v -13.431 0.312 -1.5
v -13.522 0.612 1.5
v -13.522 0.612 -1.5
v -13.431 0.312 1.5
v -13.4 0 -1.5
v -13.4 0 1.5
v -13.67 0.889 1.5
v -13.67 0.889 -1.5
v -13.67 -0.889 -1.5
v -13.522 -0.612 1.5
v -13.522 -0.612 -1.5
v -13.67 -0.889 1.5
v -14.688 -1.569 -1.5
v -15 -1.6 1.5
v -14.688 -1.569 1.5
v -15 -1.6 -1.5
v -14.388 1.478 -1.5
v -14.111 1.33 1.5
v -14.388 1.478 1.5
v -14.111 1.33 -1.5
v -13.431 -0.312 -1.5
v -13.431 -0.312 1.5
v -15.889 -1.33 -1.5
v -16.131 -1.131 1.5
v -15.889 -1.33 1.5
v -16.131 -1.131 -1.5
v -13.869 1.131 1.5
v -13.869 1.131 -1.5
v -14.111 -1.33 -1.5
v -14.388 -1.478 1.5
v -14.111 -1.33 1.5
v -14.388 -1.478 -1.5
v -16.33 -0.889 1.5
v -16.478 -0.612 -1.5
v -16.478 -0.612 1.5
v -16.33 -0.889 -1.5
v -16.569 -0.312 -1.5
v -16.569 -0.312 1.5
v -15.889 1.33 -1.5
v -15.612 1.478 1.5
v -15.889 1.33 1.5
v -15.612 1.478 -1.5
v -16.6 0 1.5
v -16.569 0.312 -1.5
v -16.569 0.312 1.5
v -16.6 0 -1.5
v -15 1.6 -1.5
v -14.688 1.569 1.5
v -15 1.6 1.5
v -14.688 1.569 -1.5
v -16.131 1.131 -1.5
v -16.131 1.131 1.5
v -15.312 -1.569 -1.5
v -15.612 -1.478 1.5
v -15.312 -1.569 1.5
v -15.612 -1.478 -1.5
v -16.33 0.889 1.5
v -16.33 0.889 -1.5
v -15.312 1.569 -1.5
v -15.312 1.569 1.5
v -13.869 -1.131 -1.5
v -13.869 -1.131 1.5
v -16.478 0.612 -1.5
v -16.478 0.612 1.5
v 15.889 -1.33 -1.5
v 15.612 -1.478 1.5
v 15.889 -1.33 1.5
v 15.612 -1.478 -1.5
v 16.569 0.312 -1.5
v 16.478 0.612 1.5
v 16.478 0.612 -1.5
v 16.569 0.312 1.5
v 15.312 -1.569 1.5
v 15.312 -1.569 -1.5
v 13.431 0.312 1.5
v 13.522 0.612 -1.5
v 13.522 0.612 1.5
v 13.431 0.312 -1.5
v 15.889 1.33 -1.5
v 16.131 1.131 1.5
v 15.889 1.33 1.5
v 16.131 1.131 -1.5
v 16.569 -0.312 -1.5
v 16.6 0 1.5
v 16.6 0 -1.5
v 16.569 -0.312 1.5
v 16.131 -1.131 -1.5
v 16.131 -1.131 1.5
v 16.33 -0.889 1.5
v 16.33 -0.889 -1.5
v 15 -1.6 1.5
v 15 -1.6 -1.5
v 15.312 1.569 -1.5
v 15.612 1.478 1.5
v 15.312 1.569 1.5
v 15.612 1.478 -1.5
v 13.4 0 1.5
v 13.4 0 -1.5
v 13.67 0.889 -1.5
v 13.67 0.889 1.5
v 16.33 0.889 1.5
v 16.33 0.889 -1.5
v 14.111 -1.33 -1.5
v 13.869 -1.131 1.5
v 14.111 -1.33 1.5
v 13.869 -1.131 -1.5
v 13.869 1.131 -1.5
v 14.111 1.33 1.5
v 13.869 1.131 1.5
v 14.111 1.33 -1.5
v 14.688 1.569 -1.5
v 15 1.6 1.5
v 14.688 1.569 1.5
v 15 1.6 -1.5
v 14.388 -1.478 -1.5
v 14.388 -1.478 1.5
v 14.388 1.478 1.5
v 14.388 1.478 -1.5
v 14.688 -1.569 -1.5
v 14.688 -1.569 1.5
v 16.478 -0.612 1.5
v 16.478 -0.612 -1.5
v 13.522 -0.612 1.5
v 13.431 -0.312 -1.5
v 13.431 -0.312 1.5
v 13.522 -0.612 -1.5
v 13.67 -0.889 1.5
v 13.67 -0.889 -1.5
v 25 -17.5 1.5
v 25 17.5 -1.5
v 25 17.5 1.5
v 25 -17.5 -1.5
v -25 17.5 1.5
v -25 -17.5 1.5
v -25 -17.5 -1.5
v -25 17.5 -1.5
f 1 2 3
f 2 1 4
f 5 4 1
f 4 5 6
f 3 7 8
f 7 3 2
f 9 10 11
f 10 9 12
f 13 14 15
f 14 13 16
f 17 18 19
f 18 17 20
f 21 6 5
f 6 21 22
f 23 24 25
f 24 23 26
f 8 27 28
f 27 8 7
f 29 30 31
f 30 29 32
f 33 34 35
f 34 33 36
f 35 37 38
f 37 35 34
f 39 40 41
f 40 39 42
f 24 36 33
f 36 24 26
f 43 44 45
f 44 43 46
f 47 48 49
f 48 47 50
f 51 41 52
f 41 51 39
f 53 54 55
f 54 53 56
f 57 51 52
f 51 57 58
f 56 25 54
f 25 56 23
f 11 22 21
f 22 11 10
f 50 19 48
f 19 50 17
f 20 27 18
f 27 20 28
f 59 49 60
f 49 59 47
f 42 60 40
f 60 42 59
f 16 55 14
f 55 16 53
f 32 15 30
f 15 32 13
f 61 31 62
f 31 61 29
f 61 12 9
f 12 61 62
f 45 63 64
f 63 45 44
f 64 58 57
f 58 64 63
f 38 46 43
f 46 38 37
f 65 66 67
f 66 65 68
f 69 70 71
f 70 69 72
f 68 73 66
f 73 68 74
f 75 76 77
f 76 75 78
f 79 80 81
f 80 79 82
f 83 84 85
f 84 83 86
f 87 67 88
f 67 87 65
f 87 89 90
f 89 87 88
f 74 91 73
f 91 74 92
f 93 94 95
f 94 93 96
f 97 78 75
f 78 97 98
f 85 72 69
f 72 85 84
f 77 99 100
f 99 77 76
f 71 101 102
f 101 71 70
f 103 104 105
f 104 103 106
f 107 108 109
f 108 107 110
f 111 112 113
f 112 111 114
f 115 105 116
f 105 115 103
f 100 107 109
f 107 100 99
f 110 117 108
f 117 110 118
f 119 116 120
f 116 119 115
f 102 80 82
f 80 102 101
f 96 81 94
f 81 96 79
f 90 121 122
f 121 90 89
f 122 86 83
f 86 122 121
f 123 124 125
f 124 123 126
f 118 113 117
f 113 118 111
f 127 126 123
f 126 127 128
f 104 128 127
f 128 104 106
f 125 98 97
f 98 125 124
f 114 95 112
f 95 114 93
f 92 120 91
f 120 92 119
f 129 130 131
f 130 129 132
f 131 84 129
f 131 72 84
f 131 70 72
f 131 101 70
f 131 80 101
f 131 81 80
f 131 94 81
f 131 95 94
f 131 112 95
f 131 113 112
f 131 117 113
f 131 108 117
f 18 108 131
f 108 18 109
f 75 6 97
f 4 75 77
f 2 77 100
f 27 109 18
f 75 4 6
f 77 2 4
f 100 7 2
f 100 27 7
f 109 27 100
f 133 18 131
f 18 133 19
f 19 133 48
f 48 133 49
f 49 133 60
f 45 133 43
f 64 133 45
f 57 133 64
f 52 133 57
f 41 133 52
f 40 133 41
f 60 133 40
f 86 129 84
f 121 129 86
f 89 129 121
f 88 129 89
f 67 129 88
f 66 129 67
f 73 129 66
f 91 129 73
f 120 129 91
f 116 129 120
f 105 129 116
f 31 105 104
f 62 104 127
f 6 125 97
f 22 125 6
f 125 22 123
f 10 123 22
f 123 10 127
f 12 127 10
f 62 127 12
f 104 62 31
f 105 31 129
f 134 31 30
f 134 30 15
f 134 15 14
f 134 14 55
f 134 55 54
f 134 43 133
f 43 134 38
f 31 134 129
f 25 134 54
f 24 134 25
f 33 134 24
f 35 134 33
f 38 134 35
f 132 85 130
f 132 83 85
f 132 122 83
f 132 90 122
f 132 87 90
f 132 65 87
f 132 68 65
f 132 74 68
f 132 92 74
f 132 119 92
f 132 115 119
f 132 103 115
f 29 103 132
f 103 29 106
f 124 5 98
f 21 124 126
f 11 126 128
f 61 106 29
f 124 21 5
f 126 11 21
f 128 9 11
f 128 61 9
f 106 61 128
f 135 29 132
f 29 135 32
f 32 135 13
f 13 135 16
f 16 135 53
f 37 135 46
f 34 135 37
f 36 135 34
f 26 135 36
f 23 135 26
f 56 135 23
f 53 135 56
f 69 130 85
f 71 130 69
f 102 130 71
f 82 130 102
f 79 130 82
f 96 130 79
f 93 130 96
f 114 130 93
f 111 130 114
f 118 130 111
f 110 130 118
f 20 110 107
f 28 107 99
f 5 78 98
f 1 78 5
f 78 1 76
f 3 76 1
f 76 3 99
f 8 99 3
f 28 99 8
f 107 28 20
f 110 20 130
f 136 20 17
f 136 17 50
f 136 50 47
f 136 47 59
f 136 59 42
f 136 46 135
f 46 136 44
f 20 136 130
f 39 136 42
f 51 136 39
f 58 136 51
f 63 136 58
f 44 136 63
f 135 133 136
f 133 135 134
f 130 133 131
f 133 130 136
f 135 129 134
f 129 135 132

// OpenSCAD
// Concept only, millimeters; verify fit and loads. No flight qualification.
width=50; depth=35; thickness=3; hole=3.2; spacing=30;
assert(width>spacing+hole && depth>hole+8 && thickness>0);
difference(){
  cube([width,depth,thickness],center=true);
  for(x=[-spacing/2,spacing/2])
    translate([x,0,0]) cylinder(h=thickness+2,d=hole,center=true,$fn=32);
}
